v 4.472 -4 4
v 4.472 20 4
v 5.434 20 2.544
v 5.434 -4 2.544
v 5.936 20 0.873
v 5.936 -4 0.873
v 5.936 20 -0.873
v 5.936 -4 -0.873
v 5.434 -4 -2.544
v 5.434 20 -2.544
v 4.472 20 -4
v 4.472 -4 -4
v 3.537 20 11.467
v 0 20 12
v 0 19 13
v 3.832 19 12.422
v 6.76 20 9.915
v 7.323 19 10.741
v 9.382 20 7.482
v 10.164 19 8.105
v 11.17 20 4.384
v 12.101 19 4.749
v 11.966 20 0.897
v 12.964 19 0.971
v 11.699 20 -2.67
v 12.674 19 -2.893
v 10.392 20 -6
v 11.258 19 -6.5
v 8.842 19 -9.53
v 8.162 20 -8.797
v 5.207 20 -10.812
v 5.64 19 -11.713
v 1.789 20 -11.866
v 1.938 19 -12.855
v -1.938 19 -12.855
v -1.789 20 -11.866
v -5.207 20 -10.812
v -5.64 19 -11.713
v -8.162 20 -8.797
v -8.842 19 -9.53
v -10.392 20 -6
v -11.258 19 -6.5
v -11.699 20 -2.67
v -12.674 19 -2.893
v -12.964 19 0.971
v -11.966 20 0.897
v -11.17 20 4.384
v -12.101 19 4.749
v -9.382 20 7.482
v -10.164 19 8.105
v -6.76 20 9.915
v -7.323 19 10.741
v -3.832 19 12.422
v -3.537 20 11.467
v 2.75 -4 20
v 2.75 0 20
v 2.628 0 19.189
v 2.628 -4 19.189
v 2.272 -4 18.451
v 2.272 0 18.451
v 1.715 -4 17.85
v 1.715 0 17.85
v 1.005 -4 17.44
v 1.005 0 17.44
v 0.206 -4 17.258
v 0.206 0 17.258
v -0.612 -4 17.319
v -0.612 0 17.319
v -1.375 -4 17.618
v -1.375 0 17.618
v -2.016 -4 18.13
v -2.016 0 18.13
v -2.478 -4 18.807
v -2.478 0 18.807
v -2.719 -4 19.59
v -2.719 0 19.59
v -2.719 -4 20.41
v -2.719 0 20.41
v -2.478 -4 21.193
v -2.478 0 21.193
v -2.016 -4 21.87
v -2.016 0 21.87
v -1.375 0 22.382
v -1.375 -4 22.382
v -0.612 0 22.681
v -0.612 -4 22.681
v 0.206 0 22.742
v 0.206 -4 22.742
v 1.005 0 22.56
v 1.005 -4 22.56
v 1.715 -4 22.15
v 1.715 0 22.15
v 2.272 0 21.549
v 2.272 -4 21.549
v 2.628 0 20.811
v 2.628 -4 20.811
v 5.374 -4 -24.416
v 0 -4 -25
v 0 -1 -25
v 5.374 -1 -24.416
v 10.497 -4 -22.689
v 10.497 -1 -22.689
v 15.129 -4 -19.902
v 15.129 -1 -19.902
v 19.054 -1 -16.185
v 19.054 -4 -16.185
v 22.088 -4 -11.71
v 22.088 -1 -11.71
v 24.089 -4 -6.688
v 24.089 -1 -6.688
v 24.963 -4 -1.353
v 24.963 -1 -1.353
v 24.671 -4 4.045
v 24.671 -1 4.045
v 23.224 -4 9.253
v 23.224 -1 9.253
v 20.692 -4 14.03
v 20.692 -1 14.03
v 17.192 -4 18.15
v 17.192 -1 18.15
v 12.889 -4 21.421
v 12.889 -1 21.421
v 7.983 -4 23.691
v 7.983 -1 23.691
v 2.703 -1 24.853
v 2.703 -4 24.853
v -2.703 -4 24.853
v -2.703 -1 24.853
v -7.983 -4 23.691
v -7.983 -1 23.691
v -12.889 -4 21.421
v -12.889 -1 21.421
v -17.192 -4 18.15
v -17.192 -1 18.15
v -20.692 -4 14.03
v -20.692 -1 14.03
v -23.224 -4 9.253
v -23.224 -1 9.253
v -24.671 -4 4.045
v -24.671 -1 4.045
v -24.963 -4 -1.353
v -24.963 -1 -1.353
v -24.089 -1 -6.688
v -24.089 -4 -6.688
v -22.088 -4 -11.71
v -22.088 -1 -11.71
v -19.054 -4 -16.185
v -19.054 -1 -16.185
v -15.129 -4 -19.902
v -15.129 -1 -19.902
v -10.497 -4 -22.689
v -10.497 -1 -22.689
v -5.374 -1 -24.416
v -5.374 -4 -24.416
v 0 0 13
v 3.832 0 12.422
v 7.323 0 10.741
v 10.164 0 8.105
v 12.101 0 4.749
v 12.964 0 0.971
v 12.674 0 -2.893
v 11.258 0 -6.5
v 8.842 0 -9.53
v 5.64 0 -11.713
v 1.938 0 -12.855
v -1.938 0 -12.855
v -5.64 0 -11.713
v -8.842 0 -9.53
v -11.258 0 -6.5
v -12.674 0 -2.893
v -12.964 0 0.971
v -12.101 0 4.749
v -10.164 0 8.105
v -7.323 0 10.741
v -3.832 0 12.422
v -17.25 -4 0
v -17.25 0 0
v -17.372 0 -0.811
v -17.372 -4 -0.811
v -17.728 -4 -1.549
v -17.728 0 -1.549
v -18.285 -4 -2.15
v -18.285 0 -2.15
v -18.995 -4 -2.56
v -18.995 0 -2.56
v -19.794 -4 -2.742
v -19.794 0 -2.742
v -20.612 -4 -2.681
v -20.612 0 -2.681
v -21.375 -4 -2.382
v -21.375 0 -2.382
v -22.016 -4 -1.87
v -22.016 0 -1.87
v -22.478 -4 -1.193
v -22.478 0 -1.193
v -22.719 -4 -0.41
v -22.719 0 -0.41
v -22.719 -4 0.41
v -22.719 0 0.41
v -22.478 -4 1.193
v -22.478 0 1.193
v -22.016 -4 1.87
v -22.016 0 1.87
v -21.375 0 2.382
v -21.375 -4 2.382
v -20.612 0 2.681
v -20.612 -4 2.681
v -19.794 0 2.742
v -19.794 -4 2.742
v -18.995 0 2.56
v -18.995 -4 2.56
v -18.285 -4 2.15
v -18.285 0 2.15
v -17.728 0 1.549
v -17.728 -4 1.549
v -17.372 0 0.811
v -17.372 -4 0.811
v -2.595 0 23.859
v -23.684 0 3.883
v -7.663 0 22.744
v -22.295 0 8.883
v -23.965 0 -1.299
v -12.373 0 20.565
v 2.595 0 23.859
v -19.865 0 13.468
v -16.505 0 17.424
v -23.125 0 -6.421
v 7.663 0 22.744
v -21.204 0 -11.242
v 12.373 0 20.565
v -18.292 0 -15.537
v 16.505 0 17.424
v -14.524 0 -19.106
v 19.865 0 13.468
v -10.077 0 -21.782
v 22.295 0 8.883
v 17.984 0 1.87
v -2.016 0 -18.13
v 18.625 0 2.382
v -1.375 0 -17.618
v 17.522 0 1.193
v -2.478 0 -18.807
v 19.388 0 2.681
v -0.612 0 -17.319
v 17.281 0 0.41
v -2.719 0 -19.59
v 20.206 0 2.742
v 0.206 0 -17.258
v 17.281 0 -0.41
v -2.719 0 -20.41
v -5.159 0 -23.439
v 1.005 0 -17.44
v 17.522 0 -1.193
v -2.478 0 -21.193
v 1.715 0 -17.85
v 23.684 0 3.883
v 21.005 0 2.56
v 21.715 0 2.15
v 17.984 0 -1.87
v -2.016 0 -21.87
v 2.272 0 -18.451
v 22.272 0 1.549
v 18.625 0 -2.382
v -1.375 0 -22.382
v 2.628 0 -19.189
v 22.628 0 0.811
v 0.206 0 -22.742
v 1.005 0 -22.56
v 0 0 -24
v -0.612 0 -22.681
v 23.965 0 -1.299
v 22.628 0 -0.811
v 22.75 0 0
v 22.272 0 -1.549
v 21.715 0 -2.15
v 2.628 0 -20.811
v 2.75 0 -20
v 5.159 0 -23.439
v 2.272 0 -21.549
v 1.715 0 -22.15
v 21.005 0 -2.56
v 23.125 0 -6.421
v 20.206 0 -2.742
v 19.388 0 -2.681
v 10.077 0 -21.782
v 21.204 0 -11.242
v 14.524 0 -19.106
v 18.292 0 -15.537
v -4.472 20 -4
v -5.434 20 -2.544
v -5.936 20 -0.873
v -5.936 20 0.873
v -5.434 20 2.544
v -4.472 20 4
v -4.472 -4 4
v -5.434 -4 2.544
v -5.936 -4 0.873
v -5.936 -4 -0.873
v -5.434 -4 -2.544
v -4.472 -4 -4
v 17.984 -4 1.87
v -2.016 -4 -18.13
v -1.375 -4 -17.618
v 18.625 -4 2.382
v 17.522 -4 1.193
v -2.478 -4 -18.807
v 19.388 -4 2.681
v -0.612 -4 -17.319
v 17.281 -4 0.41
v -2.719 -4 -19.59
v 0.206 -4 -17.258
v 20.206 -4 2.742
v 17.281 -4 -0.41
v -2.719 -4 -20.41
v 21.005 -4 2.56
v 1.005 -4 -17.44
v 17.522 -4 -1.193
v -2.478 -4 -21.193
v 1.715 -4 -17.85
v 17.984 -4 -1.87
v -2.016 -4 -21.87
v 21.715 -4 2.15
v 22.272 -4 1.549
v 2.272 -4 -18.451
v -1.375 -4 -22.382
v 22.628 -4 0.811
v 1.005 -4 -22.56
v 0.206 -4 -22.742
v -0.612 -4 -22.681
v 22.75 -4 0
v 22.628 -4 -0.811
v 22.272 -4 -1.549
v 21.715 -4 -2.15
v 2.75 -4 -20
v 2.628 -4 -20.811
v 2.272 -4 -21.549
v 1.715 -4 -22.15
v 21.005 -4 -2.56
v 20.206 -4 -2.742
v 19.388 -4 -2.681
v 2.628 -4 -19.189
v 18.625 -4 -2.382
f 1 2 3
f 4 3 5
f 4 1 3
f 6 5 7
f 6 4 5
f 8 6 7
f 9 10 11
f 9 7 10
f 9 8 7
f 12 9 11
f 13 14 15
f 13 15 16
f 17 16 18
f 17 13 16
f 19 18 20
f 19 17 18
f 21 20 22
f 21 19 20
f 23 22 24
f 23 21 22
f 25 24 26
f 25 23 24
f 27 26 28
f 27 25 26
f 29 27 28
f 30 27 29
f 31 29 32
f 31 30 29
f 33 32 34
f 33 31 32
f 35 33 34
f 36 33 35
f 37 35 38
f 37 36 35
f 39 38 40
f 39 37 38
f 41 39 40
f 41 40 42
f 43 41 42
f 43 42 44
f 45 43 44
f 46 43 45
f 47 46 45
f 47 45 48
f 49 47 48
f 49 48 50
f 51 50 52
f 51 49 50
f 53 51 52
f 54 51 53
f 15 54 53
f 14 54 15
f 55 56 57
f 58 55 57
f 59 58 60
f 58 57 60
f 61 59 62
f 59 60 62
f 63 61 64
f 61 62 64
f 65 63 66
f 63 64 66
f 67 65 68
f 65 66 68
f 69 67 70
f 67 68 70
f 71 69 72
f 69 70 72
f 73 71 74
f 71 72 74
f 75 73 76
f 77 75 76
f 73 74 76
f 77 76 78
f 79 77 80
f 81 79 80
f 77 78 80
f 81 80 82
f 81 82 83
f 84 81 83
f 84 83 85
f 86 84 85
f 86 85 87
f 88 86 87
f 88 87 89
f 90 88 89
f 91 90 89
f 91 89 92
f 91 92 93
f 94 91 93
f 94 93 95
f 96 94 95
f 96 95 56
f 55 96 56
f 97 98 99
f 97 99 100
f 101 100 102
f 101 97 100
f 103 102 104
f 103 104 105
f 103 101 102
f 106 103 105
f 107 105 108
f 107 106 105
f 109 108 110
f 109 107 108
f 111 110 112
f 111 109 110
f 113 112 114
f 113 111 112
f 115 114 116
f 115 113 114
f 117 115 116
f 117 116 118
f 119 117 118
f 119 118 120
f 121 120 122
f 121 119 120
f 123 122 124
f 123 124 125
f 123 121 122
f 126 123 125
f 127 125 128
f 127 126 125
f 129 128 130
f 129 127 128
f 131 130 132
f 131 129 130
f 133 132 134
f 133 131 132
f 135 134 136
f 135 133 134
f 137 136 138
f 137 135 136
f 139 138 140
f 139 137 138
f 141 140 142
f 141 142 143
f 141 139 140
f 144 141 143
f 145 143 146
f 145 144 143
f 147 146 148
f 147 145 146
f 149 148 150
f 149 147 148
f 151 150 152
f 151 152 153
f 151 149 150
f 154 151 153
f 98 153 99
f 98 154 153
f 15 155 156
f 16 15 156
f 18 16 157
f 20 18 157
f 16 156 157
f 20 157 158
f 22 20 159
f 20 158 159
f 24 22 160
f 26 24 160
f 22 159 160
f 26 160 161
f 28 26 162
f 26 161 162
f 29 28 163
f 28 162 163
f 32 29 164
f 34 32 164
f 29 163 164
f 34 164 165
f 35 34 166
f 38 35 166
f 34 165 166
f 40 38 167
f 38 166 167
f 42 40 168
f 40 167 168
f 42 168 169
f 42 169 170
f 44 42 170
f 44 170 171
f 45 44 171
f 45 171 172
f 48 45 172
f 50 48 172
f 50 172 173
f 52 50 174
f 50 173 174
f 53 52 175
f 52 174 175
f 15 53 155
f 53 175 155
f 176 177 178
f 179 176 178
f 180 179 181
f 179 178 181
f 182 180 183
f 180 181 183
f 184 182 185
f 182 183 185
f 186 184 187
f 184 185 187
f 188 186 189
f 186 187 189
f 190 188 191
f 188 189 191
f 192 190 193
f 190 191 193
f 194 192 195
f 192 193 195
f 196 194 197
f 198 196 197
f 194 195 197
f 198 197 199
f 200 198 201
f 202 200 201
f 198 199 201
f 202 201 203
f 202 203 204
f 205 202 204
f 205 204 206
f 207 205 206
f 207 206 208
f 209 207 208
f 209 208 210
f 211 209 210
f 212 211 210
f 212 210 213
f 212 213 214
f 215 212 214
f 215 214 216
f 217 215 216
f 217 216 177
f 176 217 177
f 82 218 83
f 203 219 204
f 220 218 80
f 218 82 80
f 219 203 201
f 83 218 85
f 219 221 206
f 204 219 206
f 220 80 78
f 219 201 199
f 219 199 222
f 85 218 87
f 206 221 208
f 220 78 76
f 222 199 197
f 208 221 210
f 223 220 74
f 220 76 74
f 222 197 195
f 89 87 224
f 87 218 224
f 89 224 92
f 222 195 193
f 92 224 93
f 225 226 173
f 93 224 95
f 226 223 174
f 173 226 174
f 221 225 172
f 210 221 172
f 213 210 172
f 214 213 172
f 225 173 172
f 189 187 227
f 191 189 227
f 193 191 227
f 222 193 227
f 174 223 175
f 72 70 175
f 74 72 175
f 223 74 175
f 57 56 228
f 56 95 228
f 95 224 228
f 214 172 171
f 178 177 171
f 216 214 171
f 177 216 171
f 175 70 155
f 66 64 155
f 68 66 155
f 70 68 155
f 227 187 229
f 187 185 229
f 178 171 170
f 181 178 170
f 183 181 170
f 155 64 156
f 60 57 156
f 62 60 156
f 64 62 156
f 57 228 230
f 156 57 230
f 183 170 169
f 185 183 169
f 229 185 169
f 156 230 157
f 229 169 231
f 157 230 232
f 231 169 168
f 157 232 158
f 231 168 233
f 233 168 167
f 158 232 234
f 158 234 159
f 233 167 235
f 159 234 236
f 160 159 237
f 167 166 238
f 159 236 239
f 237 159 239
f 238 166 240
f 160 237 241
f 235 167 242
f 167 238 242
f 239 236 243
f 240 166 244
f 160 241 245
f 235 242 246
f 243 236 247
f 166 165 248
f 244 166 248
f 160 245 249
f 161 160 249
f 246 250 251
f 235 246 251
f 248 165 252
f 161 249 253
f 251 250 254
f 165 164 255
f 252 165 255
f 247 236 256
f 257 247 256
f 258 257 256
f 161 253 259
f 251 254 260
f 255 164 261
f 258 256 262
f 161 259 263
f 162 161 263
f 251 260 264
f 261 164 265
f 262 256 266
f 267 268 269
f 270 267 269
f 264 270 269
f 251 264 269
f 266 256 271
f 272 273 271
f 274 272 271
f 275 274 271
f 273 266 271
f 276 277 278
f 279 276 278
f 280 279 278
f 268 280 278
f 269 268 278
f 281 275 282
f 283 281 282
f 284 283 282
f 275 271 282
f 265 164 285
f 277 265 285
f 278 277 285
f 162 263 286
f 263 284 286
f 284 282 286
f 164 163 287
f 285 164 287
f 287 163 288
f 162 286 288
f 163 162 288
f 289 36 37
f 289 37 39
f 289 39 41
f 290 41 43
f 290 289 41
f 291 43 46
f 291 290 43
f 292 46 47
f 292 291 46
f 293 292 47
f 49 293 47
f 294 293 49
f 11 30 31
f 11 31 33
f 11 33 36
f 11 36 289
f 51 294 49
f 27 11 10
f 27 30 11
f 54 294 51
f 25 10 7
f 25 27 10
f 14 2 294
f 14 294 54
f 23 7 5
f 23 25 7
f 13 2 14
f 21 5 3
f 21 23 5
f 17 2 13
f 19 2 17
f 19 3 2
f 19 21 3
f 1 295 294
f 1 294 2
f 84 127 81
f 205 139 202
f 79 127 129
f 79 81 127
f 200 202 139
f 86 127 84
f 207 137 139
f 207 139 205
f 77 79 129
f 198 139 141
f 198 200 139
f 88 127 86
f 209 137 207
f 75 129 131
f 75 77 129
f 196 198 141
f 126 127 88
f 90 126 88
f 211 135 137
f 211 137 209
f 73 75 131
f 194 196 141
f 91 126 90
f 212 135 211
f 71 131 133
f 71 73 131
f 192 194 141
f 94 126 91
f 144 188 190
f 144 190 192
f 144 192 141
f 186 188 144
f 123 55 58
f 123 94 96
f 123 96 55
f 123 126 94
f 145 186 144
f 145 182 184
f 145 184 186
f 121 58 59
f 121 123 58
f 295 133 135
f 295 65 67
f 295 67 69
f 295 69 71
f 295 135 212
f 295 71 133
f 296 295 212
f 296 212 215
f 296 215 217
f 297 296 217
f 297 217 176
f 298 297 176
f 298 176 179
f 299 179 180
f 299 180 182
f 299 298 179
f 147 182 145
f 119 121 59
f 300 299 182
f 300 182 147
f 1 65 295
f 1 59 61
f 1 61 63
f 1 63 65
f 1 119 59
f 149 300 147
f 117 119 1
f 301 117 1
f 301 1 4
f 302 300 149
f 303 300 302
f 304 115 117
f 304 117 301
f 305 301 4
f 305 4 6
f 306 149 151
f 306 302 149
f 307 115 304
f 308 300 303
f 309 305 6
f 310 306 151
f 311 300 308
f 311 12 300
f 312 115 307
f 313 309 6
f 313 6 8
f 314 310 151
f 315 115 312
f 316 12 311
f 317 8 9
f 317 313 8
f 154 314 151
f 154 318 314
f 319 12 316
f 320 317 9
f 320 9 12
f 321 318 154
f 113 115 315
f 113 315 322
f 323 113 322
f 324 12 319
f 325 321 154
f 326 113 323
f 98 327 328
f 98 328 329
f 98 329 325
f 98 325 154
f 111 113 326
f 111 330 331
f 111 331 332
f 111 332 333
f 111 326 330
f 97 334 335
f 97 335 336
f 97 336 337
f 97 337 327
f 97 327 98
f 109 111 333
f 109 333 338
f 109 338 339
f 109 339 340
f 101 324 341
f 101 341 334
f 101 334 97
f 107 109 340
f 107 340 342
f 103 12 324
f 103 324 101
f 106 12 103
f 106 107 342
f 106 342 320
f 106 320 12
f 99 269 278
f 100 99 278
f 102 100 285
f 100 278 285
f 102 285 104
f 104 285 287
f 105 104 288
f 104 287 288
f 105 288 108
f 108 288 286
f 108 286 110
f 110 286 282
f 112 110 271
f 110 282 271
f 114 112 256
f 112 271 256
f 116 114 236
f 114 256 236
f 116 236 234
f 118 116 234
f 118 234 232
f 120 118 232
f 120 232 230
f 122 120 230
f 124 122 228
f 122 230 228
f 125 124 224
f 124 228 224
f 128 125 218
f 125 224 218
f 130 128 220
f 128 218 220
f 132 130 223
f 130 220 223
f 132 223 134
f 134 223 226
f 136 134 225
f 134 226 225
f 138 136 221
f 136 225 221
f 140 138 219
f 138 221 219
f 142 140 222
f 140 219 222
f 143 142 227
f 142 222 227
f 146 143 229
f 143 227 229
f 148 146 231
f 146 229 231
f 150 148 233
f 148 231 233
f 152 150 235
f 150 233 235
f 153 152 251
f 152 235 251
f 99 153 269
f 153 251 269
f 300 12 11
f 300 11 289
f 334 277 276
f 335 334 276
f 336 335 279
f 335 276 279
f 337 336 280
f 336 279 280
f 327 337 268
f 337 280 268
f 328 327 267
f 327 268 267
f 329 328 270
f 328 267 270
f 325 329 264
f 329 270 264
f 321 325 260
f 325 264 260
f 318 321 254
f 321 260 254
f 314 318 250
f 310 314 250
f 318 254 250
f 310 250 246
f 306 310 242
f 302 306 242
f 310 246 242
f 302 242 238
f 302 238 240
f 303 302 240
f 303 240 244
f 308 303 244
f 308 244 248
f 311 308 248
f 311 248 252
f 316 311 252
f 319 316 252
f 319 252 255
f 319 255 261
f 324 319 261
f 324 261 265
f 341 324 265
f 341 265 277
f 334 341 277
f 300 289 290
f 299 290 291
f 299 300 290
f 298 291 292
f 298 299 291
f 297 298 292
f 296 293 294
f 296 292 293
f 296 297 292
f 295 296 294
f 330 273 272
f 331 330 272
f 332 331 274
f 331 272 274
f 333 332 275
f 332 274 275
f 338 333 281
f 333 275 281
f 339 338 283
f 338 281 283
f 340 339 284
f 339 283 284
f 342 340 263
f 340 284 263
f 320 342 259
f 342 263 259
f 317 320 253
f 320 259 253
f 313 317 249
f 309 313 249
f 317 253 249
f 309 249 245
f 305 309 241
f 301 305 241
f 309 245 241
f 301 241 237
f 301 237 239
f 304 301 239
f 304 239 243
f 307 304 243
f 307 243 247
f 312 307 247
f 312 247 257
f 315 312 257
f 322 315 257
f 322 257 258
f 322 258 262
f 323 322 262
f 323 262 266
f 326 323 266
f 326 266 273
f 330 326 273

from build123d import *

# Parameters (mm, degrees)
SKIZZE1_R                       = 13
AUFSATZ_LINEAR_AUSTRAGEN1_DEPTH = 20
AUFSATZ_LINEAR_START            = 4
SKIZZE5_R                       = 25
AUFSATZ_LINEAR_AUSTRAGEN2_DEPTH = 4
DURCHGANGSLOCH_F_R_M51_D        = 5.5
DURCHGANGSLOCH_F_R_M51_DEPTH    = 25
DURCHGANGSLOCH_F_R_M51_TIP      = 1.652366702
FASE1_SIZE                      = 1


with BuildPart() as part:
    # Skizze1 → Aufsatz-Linear austragen1 (new body)
    with BuildSketch(Plane(origin=(0, 0, 0), x_dir=(1, 0, 0), z_dir=(0, 1, 0))):
        with Locations(Location((0, 0, 0), (0, 0, 270))):
            Circle(SKIZZE1_R)
        with BuildLine():
            Line((-4.472135955, 4), (4.472135955, 4))
            ThreePointArc((4.472135955, 4), (6, 0), (4.472135955, -4))
            Line((4.472135955, -4), (-4.472135955, -4))
            ThreePointArc((-4.472135955, -4), (-6, 0), (-4.472135955, 4))
        make_face(mode=Mode.SUBTRACT)
    extrude(amount=AUFSATZ_LINEAR_AUSTRAGEN1_DEPTH)

    # Skizze5 → Aufsatz-Linear austragen2 (add)
    with BuildSketch(Plane.XZ.offset(AUFSATZ_LINEAR_START)):
        with Locations(Location((0, 0, 0), (0, 0, 270))):
            Circle(SKIZZE5_R)
        with BuildLine():
            Line((4.472135955, -4), (-4.472135955, -4))
            ThreePointArc((-4.472135955, -4), (-6, 0), (-4.472135955, 4))
            Line((-4.472135955, 4), (4.472135955, 4))
            ThreePointArc((4.472135955, 4), (6, 0), (4.472135955, -4))
        make_face(mode=Mode.SUBTRACT)
    extrude(amount=-AUFSATZ_LINEAR_AUSTRAGEN2_DEPTH)

    # Durchgangsloch für M51
    with Locations(Plane(origin=(0, -4, 0), x_dir=(-1, 0, 0), z_dir=(0, -1, 0))):
        with Locations((0, 20), (20, 0), (0, -20), (-20, 0)):
            Hole(DURCHGANGSLOCH_F_R_M51_D / 2, depth=DURCHGANGSLOCH_F_R_M51_DEPTH)
            with Locations((0, 0, -(DURCHGANGSLOCH_F_R_M51_DEPTH + DURCHGANGSLOCH_F_R_M51_TIP / 2))):  # 118° drill point
                Cone(0, DURCHGANGSLOCH_F_R_M51_D / 2, DURCHGANGSLOCH_F_R_M51_TIP, mode=Mode.SUBTRACT)

    # Fase1
    fase1_edges = [part.edges().sort_by_distance(p)[0] for p in [
        (0, 0, 25),
        (0, 20, -13),
    ]]
    chamfer(fase1_edges, length=FASE1_SIZE)


solid = part.part
